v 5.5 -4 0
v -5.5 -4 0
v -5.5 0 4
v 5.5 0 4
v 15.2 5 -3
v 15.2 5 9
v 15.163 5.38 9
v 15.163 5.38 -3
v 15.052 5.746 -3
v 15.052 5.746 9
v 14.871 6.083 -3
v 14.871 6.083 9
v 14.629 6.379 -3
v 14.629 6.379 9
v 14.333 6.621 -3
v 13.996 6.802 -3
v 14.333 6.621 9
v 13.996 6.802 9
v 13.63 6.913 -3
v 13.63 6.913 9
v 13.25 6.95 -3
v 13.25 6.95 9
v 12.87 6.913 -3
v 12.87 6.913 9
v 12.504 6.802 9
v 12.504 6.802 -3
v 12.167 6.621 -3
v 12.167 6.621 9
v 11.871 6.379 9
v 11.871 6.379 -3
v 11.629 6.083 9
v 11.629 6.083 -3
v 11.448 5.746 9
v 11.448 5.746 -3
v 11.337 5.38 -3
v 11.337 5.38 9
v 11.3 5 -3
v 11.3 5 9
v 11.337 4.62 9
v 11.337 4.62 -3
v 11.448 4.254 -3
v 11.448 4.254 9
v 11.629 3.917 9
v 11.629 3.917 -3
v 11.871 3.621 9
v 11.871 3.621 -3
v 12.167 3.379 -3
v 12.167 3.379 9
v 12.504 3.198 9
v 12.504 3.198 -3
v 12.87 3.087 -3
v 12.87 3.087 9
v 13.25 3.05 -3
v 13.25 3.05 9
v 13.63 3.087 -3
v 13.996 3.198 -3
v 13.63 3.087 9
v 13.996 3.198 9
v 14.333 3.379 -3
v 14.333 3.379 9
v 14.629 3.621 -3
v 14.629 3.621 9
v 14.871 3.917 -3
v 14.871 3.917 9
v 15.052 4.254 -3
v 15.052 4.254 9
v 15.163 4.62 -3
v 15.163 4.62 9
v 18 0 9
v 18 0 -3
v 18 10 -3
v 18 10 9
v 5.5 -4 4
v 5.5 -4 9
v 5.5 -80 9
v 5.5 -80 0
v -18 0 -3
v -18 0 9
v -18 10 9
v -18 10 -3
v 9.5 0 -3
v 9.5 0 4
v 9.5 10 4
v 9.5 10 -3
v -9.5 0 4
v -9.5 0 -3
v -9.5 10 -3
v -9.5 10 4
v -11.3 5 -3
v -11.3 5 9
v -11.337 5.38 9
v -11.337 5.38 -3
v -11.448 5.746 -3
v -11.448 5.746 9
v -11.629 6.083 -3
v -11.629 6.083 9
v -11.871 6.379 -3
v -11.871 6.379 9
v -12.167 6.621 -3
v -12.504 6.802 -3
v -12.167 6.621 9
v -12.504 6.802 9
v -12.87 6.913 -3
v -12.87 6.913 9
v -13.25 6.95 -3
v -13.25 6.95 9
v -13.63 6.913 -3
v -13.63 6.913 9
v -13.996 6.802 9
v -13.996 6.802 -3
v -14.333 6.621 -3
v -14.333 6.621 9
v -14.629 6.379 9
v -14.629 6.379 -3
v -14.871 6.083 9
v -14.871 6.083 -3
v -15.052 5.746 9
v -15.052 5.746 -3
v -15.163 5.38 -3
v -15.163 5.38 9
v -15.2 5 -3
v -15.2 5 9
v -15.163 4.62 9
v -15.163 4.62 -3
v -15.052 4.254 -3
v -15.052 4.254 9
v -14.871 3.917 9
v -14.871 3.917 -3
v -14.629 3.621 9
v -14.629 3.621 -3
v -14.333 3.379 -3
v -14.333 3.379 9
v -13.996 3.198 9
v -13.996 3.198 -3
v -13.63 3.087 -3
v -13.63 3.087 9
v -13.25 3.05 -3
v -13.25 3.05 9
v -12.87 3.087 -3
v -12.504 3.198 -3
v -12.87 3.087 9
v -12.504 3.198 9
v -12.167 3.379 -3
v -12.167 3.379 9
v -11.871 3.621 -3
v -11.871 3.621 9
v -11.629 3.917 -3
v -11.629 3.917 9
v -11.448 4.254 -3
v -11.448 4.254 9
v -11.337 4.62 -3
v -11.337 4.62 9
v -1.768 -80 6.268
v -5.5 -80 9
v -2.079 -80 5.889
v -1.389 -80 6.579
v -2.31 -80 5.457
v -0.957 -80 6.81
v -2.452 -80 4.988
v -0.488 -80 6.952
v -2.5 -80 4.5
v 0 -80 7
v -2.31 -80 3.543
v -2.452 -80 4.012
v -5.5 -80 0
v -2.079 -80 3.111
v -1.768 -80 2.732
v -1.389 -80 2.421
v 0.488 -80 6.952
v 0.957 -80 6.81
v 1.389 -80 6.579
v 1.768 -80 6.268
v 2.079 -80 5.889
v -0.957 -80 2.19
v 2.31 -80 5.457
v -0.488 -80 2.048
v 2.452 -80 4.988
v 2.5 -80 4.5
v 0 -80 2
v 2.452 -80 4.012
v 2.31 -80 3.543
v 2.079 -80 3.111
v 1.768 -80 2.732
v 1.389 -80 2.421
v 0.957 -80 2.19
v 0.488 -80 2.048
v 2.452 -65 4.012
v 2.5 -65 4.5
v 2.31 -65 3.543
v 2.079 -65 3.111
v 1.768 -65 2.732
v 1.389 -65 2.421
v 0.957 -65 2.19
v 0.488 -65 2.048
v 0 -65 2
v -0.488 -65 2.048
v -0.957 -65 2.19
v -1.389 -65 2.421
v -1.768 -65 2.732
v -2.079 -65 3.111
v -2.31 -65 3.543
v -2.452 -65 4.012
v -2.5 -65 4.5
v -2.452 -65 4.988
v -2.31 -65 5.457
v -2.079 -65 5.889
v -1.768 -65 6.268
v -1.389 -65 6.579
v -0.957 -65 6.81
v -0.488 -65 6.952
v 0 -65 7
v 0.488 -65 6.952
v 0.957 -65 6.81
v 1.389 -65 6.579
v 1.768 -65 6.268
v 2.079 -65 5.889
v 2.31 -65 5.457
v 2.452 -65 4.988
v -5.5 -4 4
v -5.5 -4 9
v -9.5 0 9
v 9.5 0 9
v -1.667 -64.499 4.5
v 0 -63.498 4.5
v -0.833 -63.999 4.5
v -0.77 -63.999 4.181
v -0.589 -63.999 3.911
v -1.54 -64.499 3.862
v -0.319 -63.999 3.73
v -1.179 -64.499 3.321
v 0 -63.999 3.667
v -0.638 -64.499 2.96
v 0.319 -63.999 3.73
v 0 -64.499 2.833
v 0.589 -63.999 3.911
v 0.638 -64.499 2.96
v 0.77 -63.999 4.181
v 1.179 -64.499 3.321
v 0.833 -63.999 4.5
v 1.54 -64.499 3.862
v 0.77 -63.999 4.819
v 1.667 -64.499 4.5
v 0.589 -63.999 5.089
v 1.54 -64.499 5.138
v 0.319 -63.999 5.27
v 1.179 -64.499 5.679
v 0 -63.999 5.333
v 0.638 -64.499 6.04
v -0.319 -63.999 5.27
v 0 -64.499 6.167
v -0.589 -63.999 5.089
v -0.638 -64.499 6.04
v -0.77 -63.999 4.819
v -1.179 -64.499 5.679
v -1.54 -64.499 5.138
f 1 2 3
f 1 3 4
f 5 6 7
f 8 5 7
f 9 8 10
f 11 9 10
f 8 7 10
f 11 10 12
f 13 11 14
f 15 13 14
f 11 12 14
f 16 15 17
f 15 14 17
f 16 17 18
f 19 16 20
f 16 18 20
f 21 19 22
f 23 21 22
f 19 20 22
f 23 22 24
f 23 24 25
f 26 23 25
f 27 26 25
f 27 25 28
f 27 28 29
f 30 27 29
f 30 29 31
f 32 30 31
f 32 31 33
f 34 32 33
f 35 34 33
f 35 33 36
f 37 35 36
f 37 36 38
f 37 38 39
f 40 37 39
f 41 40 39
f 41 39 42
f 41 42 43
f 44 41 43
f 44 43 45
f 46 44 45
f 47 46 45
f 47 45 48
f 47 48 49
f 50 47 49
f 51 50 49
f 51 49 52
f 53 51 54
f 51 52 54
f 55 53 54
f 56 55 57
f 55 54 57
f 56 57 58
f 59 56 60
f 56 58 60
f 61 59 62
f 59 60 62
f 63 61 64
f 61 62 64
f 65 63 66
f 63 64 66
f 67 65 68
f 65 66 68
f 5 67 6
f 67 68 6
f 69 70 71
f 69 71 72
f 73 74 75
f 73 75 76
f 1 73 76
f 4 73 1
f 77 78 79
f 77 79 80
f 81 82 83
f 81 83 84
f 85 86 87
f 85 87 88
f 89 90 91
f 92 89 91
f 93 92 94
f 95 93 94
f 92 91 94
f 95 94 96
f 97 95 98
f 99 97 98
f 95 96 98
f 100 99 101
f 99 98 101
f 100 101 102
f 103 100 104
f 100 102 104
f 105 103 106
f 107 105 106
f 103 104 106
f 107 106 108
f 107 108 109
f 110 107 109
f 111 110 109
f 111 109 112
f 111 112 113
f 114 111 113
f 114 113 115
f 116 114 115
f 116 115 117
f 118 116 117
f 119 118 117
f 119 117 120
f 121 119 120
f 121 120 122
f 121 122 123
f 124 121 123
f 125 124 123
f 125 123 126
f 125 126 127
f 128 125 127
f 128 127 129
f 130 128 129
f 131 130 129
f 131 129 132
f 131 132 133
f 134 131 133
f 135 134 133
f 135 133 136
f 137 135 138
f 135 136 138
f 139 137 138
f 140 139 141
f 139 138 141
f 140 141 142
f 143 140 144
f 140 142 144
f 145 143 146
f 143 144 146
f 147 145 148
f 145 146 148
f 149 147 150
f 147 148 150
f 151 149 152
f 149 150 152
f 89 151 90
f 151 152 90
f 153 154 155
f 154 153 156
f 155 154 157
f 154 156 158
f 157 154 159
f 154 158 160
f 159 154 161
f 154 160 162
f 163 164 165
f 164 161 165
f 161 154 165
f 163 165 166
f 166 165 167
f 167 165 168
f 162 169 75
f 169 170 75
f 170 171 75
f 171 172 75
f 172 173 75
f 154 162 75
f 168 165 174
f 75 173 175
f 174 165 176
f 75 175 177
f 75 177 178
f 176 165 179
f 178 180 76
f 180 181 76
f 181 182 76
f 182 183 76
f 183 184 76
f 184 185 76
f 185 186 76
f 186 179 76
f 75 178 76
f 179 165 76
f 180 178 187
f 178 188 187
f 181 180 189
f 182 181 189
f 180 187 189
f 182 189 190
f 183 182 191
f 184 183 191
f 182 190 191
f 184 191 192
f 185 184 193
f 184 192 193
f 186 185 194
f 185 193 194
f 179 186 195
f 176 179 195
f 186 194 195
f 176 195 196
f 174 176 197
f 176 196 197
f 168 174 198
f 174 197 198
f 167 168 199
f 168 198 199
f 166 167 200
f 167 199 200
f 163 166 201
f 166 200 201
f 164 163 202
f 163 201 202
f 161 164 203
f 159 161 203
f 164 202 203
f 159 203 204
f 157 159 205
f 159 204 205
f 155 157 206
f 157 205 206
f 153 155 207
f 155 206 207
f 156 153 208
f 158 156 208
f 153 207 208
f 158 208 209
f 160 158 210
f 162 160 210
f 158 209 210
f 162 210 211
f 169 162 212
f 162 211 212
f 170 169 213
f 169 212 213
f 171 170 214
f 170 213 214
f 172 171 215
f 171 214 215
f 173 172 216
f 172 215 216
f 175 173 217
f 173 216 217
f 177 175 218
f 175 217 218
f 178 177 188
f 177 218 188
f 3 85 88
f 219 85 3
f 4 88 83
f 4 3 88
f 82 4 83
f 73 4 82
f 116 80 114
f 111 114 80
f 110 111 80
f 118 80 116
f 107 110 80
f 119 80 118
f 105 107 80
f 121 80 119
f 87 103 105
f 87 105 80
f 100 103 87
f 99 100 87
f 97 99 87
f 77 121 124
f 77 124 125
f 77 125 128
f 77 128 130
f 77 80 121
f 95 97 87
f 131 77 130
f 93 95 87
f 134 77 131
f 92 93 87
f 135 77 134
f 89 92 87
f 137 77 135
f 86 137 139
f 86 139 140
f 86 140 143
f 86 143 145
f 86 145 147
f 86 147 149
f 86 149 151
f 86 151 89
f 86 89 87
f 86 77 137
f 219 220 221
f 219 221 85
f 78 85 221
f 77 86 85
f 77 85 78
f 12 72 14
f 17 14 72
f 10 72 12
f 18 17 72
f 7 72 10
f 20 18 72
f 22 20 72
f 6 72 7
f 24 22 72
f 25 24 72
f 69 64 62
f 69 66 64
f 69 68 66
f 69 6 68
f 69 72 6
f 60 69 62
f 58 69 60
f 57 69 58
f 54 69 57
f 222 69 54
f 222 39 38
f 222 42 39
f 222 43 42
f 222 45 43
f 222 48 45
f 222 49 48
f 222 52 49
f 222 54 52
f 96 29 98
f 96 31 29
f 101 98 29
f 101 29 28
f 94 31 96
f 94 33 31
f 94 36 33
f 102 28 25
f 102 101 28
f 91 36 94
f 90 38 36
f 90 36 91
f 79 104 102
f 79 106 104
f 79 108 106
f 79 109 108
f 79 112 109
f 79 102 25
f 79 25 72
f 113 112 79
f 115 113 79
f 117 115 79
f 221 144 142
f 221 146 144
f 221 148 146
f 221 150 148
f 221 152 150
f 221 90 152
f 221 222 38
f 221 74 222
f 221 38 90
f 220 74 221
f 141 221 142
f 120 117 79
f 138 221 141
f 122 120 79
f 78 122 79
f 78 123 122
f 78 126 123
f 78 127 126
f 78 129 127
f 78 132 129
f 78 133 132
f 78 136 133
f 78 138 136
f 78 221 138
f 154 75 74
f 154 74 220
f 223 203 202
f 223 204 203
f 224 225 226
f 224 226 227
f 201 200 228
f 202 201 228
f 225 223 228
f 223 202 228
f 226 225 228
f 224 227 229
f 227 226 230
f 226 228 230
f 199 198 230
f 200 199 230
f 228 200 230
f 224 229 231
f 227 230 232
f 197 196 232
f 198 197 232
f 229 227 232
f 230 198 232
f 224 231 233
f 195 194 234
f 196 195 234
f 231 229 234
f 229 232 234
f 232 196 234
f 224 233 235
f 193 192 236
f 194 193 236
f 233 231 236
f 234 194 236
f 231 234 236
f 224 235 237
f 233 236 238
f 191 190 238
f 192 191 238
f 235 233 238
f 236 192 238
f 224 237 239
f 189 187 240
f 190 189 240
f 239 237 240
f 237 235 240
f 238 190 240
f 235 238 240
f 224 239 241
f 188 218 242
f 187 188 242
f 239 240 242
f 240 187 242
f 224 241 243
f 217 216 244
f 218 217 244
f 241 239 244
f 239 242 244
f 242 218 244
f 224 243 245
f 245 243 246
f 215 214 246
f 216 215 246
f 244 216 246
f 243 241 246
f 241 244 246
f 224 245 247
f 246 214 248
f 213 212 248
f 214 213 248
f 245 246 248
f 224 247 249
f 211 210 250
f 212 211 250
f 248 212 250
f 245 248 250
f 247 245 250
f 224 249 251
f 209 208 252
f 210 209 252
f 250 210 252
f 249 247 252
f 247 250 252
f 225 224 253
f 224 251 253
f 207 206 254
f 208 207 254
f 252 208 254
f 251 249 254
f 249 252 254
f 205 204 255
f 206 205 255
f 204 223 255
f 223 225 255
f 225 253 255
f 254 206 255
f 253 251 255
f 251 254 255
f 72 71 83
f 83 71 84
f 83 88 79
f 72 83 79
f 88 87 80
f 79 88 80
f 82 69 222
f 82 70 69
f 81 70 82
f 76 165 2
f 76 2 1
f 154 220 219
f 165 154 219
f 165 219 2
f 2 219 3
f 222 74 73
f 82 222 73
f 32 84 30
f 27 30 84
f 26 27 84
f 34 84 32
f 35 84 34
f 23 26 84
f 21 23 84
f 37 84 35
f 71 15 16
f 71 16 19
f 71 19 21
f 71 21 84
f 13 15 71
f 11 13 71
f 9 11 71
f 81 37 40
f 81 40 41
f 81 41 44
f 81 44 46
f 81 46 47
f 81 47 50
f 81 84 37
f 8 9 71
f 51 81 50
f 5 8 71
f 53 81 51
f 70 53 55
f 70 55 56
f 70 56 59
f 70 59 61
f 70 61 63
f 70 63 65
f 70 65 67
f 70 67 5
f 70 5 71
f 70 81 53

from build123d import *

# Parameters (mm, degrees)
SKETCH1_W                  = 11
SKETCH1_H                  = 9
BOSS_EXTRUDE1_DEPTH        = 80
BOSS_EXTRUDE2_DEPTH        = 10
F_3_9_3_9_DIAMETER_HOLE1_D = 3.9
CHAMFER1_SIZE              = 4
M6X1_0_TAPPED_HOLE1_D      = 5
M6X1_0_TAPPED_HOLE1_DEPTH  = 15
M6X1_0_TAPPED_HOLE1_TIP    = 1.502151548


with BuildPart() as part:
    # Sketch1 → Boss-Extrude1 (new body)
    with BuildSketch(Plane(origin=(0, 0, 0), x_dir=(1, 0, 0), z_dir=(0, 1, 0))):
        with Locations((0, -4.5)):
            Rectangle(SKETCH1_W, SKETCH1_H)
    extrude(amount=-BOSS_EXTRUDE1_DEPTH)

    # Sketch2 → Boss-Extrude2 (add)
    with BuildSketch(Plane(origin=(0, 0, 0), x_dir=(1, 0, 0), z_dir=(0, 1, 0))):
        Polygon((-9.5, 3), (-9.5, -4), (9.5, -4), (9.5, 3), (18, 3), (18, -9), (-18, -9), (-18, 3), align=None)
    extrude(amount=BOSS_EXTRUDE2_DEPTH)

    # Ø3.9 (3.9) Diameter Hole1 (through all)
    with Locations(Plane(origin=(0, 0, -3), x_dir=(-1, 0, 0), z_dir=(0, 0, -1))):
        with Locations((-13.25, 5), (13.25, 5)):
            Hole(F_3_9_3_9_DIAMETER_HOLE1_D / 2)

    # Chamfer1
    chamfer1_edges = [part.edges().sort_by_distance(p)[0] for p in [
        (-5.5, 0, 6.5),
        (5.5, 0, 6.5),
    ]]
    chamfer(chamfer1_edges, length=CHAMFER1_SIZE)
    chamfer1_2_edges = [part.edges().sort_by_distance(p)[0] for p in [
        (0, 0, 0),
    ]]
    chamfer(chamfer1_2_edges, length=CHAMFER1_SIZE - 0.0001)  # a hair under: the kernel refuses the full size

    # M6x1.0 Tapped Hole1
    with Locations(Plane(origin=(0, -80, 0), x_dir=(-1, 0, 0), z_dir=(0, -1, 0))):
        with Locations((0, -4.5)):
            Hole(M6X1_0_TAPPED_HOLE1_D / 2, depth=M6X1_0_TAPPED_HOLE1_DEPTH)
            with Locations((0, 0, -(M6X1_0_TAPPED_HOLE1_DEPTH + M6X1_0_TAPPED_HOLE1_TIP / 2))):  # 118° drill point
                Cone(0, M6X1_0_TAPPED_HOLE1_D / 2, M6X1_0_TAPPED_HOLE1_TIP, mode=Mode.SUBTRACT)


solid = part.part
